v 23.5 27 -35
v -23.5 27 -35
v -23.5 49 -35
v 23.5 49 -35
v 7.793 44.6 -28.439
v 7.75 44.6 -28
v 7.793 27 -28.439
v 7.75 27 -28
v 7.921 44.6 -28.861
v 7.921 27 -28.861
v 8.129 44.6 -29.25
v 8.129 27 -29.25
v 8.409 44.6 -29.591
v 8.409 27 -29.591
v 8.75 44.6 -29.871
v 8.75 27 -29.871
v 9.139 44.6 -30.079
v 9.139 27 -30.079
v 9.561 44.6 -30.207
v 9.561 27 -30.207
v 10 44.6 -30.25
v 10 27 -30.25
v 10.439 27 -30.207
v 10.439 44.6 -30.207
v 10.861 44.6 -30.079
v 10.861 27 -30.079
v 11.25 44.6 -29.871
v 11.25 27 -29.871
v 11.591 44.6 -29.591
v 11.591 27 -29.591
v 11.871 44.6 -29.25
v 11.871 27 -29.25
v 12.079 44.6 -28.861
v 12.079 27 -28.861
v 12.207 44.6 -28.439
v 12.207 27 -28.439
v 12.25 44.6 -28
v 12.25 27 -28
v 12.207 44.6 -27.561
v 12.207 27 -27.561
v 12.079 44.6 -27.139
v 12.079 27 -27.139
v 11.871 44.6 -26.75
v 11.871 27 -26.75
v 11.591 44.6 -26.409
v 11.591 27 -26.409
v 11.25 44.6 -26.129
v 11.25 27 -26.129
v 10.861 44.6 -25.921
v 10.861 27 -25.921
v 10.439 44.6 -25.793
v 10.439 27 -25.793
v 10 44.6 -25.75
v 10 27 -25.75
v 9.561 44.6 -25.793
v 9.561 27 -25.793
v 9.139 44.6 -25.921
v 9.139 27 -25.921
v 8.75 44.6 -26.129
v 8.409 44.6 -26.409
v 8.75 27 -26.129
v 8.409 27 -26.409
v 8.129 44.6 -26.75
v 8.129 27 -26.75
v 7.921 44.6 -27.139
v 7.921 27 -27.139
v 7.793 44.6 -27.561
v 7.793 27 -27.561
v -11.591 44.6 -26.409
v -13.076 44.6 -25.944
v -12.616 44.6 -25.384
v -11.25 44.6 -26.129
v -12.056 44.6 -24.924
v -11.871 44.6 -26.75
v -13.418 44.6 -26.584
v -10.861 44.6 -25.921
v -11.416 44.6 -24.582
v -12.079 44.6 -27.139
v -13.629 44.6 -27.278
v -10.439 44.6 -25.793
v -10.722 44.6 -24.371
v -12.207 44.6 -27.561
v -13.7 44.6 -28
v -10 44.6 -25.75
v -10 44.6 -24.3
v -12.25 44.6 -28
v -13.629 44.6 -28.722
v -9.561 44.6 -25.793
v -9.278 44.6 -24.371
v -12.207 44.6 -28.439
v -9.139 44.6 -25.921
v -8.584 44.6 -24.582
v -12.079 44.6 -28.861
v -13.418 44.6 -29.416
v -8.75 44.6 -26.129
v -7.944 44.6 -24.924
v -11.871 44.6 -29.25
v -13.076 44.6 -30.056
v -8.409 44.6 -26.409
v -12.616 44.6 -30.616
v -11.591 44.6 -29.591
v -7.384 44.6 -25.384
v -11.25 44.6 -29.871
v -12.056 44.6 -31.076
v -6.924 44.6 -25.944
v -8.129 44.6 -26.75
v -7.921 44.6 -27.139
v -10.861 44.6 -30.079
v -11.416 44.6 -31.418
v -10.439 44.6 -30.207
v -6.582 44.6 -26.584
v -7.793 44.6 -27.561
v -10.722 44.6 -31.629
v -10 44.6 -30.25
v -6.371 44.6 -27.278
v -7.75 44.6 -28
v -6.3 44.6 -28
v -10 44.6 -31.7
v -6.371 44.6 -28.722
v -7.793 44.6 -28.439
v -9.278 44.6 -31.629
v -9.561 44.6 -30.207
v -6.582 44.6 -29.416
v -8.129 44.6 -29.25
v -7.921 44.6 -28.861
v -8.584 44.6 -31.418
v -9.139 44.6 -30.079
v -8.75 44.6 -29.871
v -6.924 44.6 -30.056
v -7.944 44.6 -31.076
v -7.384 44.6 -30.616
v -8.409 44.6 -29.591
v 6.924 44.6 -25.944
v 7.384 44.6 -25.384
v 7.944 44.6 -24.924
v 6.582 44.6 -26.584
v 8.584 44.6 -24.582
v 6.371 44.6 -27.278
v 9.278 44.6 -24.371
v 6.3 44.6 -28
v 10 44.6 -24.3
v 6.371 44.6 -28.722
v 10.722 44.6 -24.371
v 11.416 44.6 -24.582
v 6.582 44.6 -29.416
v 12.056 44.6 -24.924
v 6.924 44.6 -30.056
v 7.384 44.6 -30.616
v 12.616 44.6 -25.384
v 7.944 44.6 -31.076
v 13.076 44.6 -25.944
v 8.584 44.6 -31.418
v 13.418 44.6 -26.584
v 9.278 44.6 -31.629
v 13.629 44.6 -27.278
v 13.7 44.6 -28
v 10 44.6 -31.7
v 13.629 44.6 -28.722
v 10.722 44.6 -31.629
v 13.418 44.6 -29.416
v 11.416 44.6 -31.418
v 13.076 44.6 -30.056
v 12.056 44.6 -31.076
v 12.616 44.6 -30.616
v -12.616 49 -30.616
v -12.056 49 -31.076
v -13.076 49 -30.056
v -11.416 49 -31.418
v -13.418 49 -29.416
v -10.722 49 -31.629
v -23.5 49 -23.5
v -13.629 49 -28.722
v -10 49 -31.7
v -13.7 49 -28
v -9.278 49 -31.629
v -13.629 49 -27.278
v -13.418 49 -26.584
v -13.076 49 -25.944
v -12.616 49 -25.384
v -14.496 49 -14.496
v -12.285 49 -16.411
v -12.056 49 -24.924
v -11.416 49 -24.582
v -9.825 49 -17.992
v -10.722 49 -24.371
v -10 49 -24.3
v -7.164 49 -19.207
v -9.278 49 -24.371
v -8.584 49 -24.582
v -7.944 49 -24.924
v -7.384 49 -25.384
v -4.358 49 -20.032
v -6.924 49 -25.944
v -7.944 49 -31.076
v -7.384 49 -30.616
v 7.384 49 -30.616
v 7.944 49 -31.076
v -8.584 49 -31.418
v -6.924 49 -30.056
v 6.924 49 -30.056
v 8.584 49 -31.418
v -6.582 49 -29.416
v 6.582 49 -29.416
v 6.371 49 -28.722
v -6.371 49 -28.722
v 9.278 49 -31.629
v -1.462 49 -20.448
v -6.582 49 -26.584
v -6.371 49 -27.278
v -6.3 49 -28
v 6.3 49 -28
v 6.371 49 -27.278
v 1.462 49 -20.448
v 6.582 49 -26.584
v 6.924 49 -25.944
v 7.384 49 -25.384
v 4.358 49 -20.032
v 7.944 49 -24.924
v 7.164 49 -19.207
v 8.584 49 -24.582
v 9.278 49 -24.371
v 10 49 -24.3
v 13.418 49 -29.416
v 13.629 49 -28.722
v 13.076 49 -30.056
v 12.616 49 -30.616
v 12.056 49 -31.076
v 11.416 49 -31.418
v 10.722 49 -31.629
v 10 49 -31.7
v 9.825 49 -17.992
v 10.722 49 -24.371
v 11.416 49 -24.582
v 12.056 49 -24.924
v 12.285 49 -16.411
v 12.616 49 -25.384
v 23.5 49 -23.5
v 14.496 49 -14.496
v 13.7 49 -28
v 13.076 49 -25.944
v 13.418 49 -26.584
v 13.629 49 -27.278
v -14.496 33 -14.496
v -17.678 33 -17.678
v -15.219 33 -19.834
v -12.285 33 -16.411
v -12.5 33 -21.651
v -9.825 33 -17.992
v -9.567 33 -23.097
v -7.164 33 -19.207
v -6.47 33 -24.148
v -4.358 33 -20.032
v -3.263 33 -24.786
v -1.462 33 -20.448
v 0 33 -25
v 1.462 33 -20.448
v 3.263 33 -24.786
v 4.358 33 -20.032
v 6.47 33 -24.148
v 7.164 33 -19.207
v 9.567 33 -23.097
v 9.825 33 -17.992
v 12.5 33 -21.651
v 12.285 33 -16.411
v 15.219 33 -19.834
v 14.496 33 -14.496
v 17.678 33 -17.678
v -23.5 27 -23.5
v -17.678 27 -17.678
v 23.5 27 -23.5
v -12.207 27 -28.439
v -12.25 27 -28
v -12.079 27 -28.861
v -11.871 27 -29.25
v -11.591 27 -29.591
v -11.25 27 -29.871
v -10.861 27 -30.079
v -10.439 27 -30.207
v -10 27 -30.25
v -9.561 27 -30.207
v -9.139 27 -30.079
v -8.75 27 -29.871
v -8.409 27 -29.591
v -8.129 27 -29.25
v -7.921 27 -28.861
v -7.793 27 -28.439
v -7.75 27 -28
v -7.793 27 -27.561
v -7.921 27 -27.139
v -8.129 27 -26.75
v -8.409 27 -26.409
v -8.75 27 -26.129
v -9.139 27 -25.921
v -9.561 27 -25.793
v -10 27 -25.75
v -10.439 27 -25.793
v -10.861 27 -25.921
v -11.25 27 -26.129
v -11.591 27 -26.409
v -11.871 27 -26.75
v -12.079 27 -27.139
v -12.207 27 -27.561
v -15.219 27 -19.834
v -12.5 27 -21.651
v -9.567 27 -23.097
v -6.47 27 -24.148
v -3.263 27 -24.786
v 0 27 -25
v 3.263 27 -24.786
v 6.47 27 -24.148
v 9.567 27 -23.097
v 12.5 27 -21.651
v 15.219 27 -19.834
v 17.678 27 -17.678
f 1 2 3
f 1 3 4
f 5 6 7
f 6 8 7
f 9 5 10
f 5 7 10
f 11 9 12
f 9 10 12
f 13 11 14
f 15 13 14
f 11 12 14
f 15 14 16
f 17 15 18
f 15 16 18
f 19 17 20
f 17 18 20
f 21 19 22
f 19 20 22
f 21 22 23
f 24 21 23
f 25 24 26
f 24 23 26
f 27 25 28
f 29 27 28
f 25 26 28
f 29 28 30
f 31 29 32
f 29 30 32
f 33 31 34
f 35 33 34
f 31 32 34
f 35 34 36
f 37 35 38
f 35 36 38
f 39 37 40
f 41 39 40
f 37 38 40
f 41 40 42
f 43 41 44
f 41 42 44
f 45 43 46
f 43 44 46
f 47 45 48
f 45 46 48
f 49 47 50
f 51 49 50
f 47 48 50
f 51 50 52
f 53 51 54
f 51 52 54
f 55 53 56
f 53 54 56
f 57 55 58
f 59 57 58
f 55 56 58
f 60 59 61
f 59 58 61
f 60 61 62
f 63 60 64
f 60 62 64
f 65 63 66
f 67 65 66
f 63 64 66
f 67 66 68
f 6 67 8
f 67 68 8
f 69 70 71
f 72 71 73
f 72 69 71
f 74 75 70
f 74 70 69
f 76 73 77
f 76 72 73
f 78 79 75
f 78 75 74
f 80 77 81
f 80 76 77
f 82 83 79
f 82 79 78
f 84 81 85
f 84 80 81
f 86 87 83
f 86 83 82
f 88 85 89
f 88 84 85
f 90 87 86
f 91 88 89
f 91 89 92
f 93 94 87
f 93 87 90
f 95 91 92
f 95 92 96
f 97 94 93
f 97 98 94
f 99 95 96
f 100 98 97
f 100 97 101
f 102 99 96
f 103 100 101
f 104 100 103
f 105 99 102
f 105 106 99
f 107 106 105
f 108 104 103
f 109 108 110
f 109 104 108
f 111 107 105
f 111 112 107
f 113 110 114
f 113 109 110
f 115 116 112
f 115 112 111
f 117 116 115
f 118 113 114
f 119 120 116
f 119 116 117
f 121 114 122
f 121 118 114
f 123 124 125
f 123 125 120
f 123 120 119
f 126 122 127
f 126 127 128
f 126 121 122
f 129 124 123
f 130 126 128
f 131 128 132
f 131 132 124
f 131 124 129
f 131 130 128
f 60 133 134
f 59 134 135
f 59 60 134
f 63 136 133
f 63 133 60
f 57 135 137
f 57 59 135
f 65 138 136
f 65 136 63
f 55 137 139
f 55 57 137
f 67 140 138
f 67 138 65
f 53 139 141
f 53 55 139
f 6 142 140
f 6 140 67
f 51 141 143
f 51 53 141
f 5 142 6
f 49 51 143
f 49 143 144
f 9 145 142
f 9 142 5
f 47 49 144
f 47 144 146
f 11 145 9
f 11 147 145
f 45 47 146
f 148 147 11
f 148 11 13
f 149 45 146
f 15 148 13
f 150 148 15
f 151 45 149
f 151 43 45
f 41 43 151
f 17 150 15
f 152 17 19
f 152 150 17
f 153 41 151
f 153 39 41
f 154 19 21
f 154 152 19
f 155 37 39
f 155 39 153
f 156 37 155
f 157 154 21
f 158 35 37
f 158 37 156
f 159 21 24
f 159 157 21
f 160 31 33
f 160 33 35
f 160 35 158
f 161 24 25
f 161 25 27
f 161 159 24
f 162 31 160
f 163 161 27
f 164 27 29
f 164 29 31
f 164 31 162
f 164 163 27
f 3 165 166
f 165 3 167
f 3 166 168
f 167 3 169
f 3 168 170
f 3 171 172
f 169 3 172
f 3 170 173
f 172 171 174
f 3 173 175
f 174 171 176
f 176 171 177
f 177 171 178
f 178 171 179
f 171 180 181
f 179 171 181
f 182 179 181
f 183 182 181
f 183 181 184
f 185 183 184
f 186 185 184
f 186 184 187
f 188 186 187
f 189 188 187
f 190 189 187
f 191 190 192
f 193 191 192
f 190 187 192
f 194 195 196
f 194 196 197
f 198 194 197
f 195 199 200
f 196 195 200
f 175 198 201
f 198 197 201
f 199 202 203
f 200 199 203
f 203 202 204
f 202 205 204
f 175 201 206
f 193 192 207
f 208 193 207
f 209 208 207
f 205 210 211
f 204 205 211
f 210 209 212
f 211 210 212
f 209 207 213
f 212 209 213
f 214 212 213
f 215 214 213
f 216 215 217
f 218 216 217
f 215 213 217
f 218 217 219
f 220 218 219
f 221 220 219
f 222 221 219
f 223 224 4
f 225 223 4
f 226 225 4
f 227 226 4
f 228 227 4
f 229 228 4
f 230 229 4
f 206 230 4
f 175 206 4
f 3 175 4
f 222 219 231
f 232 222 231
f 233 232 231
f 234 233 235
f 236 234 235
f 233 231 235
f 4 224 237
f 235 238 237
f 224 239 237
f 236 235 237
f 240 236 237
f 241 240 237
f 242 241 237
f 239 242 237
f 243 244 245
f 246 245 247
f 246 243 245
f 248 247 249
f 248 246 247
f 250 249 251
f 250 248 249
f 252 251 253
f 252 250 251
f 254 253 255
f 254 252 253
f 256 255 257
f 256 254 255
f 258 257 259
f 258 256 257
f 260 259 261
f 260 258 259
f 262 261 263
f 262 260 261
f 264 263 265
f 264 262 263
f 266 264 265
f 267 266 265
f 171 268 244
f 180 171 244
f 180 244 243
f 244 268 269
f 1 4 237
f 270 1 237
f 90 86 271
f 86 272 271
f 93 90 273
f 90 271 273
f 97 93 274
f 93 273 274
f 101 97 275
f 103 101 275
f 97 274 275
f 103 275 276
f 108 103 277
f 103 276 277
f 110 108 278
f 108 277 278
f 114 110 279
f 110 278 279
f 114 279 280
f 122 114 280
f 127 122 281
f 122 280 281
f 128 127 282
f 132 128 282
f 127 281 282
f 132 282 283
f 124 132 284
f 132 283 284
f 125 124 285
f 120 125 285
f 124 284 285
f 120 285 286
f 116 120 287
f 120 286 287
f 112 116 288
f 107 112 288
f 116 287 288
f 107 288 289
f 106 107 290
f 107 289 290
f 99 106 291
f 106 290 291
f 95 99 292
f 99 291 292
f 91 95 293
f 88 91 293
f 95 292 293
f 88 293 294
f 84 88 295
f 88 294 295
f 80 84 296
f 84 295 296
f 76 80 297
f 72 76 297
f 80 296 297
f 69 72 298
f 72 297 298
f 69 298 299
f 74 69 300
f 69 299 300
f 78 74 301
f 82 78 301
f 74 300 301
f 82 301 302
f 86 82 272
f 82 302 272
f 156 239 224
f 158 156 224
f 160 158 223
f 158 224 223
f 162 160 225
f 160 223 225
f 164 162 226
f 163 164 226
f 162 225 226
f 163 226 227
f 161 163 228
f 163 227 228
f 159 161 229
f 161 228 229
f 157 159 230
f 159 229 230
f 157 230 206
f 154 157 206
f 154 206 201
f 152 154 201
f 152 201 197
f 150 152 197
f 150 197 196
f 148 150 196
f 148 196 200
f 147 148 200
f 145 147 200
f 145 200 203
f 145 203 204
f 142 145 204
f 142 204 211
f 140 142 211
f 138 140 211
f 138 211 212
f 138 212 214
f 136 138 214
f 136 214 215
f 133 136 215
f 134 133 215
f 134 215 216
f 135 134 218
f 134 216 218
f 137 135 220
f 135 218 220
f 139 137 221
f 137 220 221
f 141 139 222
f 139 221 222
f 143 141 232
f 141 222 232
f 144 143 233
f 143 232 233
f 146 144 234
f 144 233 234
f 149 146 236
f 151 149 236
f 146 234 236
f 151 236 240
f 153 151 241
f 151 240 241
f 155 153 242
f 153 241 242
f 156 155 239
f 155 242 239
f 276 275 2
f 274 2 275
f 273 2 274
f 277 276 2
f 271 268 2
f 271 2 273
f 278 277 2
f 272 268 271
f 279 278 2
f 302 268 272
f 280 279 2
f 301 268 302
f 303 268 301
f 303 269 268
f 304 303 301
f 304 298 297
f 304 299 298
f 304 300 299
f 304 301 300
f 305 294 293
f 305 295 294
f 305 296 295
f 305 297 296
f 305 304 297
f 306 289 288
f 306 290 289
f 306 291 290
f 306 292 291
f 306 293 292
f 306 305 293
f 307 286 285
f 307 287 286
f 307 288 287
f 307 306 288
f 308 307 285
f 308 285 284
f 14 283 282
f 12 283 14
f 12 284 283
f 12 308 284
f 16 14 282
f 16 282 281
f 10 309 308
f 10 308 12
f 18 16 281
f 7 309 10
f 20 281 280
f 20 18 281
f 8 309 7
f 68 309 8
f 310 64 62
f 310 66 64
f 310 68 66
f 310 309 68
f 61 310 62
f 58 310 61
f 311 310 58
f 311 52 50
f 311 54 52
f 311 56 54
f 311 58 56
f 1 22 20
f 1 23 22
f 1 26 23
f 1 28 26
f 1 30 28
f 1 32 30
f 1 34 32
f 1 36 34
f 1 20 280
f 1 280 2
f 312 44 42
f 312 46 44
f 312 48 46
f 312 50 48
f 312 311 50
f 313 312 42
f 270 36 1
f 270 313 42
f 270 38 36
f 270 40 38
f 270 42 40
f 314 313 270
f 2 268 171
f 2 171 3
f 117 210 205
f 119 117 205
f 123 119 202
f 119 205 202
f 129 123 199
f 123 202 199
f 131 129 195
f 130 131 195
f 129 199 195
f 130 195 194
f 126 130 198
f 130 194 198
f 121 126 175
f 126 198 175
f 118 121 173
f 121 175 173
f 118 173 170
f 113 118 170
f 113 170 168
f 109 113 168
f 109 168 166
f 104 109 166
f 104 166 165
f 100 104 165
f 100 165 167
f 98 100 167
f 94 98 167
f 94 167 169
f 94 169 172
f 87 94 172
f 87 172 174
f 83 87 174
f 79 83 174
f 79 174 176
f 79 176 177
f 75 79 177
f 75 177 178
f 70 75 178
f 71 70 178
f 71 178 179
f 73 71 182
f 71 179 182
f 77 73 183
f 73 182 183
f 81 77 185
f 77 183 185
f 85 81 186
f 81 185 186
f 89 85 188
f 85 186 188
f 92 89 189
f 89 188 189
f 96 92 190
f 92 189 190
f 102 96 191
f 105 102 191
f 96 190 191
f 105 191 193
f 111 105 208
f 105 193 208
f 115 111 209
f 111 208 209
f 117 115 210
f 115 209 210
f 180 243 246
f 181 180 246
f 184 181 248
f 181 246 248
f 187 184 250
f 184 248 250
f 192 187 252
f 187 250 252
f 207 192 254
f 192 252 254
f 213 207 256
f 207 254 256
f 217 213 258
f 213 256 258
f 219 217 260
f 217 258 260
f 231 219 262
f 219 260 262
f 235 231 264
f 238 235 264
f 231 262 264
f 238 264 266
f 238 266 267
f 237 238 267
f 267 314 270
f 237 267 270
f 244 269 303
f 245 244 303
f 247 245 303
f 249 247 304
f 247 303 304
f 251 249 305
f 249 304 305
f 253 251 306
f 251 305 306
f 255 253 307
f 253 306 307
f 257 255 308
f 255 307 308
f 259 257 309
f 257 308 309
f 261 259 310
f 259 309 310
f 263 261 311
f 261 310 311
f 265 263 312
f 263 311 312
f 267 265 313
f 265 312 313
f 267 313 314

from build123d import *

# Parameters (mm, degrees)
PAD046_DEPTH     = 22
SKETCH_R         = 25
POCKET_DEPTH     = 6
HOLE_D           = 4.5
HOLE_CBORE_D     = 7.4
HOLE_CBORE_DEPTH = 4.4


with BuildPart() as part:
    # Sketch078 → Pad046 (new body)
    with BuildSketch(Plane.XZ.offset(-27)):
        with BuildLine():
            Line((-23.5, -35), (23.5, -35))
            Line((23.5, -35), (23.5, -23.5))
            Line((14.495689, -14.495689), (23.5, -23.5))
            ThreePointArc((-14.495689, -14.495689), (0, -20.5), (14.495689, -14.495689))
            Line((-23.5, -23.5), (-14.495689, -14.495689))
            Line((-23.5, -23.5), (-23.5, -35))
        make_face()
    extrude(amount=-PAD046_DEPTH)

    # Sketch → Pocket (cut)
    with BuildSketch(Plane.XZ.offset(-27)):
        Circle(SKETCH_R)
    extrude(amount=-POCKET_DEPTH, mode=Mode.SUBTRACT)

    # Hole (through all)
    with Locations(Plane(origin=(0, 49, 0), x_dir=(1, 0, 0), z_dir=(0, 1, 0))):
        with Locations((-10, 28), (10, 28)):
            CounterBoreHole(HOLE_D / 2, HOLE_CBORE_D / 2, HOLE_CBORE_DEPTH)


solid = part.part
